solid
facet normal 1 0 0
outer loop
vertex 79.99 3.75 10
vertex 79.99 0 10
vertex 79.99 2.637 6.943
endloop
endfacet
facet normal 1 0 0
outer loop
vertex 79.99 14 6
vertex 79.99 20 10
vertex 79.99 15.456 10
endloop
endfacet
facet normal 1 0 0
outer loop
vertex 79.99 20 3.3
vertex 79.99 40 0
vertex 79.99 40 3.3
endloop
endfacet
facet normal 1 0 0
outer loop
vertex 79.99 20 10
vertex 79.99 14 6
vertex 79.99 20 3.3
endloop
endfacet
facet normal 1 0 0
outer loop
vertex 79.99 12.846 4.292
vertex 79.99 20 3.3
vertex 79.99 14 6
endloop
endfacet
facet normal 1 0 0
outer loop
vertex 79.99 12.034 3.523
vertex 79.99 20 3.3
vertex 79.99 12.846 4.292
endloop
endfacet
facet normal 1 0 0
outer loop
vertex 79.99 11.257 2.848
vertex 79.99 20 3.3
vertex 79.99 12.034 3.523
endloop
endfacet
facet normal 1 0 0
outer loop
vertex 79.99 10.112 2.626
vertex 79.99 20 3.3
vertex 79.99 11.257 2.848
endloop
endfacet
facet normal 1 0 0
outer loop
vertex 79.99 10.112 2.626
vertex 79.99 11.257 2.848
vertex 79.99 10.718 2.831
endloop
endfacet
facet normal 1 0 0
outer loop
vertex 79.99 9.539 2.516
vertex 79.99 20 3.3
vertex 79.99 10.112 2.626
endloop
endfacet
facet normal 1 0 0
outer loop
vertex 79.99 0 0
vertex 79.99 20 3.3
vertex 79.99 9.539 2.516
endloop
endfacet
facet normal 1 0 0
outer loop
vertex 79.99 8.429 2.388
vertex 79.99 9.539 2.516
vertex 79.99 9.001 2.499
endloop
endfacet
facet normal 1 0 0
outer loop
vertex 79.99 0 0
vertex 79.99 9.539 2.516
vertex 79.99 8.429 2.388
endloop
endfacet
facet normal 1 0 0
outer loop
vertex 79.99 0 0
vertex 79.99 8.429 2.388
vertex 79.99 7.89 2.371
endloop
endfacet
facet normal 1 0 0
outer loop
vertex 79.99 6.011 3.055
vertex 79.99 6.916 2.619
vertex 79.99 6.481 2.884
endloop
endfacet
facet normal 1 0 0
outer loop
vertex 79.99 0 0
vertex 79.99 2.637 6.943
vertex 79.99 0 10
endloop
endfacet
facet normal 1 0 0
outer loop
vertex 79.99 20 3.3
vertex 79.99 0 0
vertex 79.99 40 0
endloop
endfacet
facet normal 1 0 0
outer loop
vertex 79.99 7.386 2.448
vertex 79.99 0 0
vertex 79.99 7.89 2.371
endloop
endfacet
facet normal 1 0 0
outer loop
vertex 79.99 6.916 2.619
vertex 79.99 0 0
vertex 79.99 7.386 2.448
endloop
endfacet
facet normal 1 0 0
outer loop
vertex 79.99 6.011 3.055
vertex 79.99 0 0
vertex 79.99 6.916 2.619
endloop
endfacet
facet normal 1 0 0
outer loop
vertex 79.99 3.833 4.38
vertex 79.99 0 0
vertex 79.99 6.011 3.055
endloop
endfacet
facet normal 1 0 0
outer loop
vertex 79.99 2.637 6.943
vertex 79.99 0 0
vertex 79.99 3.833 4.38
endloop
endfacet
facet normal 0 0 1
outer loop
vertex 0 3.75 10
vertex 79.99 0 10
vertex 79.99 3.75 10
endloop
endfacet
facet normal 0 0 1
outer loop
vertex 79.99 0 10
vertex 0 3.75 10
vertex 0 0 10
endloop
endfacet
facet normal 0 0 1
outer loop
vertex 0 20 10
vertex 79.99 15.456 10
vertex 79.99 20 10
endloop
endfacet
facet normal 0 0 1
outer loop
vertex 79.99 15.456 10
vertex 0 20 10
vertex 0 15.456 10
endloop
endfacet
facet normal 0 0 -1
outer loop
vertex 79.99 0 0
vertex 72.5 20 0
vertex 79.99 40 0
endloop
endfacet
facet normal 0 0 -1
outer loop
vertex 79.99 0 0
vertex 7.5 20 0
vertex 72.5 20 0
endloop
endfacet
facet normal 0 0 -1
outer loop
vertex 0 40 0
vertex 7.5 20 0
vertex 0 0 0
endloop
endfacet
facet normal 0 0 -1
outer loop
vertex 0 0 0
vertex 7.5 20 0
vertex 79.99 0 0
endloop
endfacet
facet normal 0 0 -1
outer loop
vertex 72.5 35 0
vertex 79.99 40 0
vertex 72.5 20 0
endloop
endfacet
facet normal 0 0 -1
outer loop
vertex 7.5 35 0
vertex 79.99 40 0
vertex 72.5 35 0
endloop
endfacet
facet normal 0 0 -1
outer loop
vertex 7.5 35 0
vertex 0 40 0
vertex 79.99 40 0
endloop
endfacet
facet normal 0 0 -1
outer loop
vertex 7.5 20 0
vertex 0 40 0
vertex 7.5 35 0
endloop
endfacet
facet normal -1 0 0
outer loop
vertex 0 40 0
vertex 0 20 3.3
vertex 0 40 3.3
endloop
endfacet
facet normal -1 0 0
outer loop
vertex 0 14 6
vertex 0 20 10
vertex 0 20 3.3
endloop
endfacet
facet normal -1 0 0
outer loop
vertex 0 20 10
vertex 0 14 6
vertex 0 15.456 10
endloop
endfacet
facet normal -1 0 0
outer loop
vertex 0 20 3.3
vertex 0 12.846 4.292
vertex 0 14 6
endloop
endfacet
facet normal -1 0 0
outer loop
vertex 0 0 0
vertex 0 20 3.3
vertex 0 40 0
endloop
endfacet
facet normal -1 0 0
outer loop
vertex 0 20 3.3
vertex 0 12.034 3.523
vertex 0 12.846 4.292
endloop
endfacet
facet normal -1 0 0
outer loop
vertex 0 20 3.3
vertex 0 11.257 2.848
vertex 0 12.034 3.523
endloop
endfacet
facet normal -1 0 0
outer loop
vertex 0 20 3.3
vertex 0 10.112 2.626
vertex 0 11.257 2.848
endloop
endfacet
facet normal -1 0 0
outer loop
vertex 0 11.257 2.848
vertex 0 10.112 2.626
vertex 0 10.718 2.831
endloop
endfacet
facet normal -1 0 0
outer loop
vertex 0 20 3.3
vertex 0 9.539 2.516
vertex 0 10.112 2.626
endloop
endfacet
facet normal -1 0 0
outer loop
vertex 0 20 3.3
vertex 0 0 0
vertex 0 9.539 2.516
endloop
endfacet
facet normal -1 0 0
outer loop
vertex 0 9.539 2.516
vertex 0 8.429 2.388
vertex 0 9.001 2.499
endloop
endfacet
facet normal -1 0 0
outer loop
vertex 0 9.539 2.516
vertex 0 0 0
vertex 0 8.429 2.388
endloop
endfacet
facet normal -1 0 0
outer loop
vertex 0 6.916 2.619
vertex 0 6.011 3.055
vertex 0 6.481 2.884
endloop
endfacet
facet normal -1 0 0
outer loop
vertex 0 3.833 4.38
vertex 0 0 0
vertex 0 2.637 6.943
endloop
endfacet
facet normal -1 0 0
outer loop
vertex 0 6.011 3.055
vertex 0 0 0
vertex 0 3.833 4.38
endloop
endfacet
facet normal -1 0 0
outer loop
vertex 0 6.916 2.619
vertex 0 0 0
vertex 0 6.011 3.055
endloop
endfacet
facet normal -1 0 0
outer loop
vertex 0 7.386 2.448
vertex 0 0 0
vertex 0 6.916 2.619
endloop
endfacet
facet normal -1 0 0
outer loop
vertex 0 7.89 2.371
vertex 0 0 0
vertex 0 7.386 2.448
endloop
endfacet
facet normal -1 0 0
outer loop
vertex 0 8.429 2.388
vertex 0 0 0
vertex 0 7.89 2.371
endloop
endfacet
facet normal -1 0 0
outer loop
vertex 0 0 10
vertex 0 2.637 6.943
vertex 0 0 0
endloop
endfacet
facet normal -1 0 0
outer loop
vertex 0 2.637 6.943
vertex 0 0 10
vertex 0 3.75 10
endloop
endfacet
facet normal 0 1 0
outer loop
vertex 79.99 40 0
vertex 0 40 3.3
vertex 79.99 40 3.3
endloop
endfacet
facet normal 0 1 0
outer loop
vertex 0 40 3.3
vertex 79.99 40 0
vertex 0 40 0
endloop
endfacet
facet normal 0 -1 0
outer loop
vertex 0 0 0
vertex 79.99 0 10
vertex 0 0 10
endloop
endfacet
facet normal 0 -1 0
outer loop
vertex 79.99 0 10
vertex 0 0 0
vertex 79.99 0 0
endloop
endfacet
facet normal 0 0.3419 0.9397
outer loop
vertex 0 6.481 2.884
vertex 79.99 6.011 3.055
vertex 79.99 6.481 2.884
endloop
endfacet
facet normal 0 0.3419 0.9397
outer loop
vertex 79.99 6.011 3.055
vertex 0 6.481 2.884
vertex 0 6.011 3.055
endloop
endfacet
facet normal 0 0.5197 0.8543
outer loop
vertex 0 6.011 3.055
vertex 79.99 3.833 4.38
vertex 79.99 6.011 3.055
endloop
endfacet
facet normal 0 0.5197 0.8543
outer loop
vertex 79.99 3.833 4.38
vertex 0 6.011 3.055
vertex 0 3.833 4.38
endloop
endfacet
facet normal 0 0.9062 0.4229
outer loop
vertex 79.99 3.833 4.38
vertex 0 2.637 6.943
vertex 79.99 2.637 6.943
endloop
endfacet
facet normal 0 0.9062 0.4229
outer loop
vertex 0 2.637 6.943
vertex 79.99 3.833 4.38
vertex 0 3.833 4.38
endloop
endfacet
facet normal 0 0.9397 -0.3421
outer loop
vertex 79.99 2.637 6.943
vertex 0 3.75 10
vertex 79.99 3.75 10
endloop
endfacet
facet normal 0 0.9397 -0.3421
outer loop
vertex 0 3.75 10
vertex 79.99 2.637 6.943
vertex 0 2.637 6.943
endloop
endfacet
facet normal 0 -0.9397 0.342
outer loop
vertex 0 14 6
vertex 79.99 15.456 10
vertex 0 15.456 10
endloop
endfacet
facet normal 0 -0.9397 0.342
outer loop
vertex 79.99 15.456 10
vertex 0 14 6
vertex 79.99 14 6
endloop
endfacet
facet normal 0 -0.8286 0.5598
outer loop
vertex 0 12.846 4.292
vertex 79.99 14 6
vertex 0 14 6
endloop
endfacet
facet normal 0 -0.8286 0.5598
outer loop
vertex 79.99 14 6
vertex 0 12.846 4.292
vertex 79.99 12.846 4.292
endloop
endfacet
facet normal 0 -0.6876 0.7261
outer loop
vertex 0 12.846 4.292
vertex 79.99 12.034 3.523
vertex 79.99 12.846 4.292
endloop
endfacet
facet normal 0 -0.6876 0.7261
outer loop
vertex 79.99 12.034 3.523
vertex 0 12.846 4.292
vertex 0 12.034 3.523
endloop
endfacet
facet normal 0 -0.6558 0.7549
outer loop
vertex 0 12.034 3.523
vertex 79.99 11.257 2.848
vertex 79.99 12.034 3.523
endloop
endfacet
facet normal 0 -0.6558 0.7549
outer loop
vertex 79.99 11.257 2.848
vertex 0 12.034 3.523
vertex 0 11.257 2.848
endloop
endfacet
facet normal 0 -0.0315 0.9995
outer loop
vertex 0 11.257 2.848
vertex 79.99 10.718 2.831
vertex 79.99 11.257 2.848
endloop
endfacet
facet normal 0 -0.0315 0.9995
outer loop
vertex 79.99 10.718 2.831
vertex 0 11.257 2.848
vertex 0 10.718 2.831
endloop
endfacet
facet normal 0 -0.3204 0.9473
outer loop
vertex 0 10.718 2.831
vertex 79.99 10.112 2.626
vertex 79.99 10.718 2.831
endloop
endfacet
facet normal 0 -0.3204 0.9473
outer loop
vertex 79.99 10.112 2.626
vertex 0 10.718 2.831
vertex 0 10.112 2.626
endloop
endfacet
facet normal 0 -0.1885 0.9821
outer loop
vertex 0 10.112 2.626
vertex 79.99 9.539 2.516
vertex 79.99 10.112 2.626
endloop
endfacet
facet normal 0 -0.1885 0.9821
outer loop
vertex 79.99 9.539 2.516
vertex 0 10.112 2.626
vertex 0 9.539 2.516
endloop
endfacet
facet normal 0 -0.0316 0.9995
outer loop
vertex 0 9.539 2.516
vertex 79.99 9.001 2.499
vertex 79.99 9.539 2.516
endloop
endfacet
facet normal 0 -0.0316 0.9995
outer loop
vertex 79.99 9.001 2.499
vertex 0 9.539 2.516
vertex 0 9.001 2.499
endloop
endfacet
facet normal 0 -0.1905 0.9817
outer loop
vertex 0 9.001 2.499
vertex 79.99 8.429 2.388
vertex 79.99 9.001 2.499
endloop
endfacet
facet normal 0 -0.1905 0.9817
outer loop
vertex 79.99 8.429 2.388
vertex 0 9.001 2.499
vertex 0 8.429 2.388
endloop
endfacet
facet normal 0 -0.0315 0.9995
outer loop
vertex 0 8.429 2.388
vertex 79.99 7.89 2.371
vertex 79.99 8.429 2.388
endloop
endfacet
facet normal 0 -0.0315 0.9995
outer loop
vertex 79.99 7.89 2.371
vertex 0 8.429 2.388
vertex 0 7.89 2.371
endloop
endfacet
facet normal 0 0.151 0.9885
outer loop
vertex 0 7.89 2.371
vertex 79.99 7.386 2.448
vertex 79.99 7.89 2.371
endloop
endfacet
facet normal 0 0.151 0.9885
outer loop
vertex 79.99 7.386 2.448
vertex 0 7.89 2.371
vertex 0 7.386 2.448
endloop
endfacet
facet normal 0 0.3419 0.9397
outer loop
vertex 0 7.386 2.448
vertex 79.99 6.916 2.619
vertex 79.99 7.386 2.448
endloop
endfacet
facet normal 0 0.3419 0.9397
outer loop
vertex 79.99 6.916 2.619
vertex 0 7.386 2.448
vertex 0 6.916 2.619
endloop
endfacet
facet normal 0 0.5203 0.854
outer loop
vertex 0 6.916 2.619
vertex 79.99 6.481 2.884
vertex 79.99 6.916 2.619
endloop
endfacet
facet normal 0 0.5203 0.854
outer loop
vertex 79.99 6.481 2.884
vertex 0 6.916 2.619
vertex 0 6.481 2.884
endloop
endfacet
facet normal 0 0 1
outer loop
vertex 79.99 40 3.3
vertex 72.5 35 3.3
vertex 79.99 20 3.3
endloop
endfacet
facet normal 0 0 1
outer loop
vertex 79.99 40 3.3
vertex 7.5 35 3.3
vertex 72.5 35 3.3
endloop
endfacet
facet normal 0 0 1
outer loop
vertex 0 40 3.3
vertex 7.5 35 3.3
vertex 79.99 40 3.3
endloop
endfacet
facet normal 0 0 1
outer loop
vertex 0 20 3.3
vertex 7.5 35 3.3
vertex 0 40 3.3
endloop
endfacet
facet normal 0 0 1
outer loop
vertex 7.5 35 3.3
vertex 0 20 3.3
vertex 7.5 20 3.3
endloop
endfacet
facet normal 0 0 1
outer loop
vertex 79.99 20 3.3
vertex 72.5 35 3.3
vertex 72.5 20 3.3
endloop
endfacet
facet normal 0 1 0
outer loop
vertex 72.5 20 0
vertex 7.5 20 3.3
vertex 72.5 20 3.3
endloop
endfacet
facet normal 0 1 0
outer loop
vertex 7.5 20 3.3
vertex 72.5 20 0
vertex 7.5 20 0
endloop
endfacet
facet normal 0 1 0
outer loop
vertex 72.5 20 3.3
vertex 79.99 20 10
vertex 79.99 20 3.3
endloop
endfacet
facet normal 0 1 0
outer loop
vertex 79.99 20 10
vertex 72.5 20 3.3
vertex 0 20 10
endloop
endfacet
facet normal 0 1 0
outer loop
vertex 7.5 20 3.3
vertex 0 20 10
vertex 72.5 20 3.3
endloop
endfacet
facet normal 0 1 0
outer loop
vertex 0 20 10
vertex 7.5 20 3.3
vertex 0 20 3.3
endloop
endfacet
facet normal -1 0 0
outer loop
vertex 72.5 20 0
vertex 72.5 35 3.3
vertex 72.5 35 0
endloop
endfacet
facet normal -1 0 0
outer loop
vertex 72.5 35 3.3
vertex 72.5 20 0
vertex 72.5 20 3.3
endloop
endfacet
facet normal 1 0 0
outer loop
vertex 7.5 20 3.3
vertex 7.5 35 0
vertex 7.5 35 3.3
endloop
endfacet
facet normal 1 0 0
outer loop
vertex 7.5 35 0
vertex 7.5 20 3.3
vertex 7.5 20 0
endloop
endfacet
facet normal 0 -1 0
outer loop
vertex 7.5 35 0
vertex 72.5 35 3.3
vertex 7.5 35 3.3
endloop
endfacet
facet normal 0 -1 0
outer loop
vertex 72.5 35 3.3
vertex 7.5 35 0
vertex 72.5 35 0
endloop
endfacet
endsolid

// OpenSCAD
// HTC Desire stand

EPS=0.01;
$fs=0.2;

StandX=80;
StandY=40;
StandZ=10;
Inset=7.5;

module desire() {
  translate([StandX+EPS,0,0]) rotate(70,[1,0,0]) rotate(-90,[0,1,0])
  linear_extrude(height = StandX+2*EPS, center = false, convexity = 10, twist = 0)
  polygon(points=[[0,10],[0,0],[0.5,-2],[1,-3],[1.5,-3.9],[2,-4.1],[2.5,-4.5],[3,-4.8]
        ,[3.5,-5],[4,-5.3],[4.5,-5.5],[5,-5.6],[5.5,-5.6],[6,-5.5]
        ,[6.5,-5.5],[7,-5.4],[7.5,-5.3],[8,-5.2],[8.5,-5.1],[9,-5]
        ,[9.5,-4.5],[10,-4],[10.5,-3.5],[11,-3],[11,1]],
          	  paths=[[0,1,2,3,4,5,6,7,8,9,10,11,12,13,14,15,16,17,18,19,20,21,22,23,24]]);
}

difference() {
  cube(size=[StandX-EPS,StandY,StandZ]);
  translate([0,14,6]) desire();
  translate([-EPS,20,3.3]) cube(size=[StandX+2*EPS,StandY,StandZ]);
  translate([Inset,20,-EPS]) cube(size=[StandX-Inset*2,15,StandZ]);
}
